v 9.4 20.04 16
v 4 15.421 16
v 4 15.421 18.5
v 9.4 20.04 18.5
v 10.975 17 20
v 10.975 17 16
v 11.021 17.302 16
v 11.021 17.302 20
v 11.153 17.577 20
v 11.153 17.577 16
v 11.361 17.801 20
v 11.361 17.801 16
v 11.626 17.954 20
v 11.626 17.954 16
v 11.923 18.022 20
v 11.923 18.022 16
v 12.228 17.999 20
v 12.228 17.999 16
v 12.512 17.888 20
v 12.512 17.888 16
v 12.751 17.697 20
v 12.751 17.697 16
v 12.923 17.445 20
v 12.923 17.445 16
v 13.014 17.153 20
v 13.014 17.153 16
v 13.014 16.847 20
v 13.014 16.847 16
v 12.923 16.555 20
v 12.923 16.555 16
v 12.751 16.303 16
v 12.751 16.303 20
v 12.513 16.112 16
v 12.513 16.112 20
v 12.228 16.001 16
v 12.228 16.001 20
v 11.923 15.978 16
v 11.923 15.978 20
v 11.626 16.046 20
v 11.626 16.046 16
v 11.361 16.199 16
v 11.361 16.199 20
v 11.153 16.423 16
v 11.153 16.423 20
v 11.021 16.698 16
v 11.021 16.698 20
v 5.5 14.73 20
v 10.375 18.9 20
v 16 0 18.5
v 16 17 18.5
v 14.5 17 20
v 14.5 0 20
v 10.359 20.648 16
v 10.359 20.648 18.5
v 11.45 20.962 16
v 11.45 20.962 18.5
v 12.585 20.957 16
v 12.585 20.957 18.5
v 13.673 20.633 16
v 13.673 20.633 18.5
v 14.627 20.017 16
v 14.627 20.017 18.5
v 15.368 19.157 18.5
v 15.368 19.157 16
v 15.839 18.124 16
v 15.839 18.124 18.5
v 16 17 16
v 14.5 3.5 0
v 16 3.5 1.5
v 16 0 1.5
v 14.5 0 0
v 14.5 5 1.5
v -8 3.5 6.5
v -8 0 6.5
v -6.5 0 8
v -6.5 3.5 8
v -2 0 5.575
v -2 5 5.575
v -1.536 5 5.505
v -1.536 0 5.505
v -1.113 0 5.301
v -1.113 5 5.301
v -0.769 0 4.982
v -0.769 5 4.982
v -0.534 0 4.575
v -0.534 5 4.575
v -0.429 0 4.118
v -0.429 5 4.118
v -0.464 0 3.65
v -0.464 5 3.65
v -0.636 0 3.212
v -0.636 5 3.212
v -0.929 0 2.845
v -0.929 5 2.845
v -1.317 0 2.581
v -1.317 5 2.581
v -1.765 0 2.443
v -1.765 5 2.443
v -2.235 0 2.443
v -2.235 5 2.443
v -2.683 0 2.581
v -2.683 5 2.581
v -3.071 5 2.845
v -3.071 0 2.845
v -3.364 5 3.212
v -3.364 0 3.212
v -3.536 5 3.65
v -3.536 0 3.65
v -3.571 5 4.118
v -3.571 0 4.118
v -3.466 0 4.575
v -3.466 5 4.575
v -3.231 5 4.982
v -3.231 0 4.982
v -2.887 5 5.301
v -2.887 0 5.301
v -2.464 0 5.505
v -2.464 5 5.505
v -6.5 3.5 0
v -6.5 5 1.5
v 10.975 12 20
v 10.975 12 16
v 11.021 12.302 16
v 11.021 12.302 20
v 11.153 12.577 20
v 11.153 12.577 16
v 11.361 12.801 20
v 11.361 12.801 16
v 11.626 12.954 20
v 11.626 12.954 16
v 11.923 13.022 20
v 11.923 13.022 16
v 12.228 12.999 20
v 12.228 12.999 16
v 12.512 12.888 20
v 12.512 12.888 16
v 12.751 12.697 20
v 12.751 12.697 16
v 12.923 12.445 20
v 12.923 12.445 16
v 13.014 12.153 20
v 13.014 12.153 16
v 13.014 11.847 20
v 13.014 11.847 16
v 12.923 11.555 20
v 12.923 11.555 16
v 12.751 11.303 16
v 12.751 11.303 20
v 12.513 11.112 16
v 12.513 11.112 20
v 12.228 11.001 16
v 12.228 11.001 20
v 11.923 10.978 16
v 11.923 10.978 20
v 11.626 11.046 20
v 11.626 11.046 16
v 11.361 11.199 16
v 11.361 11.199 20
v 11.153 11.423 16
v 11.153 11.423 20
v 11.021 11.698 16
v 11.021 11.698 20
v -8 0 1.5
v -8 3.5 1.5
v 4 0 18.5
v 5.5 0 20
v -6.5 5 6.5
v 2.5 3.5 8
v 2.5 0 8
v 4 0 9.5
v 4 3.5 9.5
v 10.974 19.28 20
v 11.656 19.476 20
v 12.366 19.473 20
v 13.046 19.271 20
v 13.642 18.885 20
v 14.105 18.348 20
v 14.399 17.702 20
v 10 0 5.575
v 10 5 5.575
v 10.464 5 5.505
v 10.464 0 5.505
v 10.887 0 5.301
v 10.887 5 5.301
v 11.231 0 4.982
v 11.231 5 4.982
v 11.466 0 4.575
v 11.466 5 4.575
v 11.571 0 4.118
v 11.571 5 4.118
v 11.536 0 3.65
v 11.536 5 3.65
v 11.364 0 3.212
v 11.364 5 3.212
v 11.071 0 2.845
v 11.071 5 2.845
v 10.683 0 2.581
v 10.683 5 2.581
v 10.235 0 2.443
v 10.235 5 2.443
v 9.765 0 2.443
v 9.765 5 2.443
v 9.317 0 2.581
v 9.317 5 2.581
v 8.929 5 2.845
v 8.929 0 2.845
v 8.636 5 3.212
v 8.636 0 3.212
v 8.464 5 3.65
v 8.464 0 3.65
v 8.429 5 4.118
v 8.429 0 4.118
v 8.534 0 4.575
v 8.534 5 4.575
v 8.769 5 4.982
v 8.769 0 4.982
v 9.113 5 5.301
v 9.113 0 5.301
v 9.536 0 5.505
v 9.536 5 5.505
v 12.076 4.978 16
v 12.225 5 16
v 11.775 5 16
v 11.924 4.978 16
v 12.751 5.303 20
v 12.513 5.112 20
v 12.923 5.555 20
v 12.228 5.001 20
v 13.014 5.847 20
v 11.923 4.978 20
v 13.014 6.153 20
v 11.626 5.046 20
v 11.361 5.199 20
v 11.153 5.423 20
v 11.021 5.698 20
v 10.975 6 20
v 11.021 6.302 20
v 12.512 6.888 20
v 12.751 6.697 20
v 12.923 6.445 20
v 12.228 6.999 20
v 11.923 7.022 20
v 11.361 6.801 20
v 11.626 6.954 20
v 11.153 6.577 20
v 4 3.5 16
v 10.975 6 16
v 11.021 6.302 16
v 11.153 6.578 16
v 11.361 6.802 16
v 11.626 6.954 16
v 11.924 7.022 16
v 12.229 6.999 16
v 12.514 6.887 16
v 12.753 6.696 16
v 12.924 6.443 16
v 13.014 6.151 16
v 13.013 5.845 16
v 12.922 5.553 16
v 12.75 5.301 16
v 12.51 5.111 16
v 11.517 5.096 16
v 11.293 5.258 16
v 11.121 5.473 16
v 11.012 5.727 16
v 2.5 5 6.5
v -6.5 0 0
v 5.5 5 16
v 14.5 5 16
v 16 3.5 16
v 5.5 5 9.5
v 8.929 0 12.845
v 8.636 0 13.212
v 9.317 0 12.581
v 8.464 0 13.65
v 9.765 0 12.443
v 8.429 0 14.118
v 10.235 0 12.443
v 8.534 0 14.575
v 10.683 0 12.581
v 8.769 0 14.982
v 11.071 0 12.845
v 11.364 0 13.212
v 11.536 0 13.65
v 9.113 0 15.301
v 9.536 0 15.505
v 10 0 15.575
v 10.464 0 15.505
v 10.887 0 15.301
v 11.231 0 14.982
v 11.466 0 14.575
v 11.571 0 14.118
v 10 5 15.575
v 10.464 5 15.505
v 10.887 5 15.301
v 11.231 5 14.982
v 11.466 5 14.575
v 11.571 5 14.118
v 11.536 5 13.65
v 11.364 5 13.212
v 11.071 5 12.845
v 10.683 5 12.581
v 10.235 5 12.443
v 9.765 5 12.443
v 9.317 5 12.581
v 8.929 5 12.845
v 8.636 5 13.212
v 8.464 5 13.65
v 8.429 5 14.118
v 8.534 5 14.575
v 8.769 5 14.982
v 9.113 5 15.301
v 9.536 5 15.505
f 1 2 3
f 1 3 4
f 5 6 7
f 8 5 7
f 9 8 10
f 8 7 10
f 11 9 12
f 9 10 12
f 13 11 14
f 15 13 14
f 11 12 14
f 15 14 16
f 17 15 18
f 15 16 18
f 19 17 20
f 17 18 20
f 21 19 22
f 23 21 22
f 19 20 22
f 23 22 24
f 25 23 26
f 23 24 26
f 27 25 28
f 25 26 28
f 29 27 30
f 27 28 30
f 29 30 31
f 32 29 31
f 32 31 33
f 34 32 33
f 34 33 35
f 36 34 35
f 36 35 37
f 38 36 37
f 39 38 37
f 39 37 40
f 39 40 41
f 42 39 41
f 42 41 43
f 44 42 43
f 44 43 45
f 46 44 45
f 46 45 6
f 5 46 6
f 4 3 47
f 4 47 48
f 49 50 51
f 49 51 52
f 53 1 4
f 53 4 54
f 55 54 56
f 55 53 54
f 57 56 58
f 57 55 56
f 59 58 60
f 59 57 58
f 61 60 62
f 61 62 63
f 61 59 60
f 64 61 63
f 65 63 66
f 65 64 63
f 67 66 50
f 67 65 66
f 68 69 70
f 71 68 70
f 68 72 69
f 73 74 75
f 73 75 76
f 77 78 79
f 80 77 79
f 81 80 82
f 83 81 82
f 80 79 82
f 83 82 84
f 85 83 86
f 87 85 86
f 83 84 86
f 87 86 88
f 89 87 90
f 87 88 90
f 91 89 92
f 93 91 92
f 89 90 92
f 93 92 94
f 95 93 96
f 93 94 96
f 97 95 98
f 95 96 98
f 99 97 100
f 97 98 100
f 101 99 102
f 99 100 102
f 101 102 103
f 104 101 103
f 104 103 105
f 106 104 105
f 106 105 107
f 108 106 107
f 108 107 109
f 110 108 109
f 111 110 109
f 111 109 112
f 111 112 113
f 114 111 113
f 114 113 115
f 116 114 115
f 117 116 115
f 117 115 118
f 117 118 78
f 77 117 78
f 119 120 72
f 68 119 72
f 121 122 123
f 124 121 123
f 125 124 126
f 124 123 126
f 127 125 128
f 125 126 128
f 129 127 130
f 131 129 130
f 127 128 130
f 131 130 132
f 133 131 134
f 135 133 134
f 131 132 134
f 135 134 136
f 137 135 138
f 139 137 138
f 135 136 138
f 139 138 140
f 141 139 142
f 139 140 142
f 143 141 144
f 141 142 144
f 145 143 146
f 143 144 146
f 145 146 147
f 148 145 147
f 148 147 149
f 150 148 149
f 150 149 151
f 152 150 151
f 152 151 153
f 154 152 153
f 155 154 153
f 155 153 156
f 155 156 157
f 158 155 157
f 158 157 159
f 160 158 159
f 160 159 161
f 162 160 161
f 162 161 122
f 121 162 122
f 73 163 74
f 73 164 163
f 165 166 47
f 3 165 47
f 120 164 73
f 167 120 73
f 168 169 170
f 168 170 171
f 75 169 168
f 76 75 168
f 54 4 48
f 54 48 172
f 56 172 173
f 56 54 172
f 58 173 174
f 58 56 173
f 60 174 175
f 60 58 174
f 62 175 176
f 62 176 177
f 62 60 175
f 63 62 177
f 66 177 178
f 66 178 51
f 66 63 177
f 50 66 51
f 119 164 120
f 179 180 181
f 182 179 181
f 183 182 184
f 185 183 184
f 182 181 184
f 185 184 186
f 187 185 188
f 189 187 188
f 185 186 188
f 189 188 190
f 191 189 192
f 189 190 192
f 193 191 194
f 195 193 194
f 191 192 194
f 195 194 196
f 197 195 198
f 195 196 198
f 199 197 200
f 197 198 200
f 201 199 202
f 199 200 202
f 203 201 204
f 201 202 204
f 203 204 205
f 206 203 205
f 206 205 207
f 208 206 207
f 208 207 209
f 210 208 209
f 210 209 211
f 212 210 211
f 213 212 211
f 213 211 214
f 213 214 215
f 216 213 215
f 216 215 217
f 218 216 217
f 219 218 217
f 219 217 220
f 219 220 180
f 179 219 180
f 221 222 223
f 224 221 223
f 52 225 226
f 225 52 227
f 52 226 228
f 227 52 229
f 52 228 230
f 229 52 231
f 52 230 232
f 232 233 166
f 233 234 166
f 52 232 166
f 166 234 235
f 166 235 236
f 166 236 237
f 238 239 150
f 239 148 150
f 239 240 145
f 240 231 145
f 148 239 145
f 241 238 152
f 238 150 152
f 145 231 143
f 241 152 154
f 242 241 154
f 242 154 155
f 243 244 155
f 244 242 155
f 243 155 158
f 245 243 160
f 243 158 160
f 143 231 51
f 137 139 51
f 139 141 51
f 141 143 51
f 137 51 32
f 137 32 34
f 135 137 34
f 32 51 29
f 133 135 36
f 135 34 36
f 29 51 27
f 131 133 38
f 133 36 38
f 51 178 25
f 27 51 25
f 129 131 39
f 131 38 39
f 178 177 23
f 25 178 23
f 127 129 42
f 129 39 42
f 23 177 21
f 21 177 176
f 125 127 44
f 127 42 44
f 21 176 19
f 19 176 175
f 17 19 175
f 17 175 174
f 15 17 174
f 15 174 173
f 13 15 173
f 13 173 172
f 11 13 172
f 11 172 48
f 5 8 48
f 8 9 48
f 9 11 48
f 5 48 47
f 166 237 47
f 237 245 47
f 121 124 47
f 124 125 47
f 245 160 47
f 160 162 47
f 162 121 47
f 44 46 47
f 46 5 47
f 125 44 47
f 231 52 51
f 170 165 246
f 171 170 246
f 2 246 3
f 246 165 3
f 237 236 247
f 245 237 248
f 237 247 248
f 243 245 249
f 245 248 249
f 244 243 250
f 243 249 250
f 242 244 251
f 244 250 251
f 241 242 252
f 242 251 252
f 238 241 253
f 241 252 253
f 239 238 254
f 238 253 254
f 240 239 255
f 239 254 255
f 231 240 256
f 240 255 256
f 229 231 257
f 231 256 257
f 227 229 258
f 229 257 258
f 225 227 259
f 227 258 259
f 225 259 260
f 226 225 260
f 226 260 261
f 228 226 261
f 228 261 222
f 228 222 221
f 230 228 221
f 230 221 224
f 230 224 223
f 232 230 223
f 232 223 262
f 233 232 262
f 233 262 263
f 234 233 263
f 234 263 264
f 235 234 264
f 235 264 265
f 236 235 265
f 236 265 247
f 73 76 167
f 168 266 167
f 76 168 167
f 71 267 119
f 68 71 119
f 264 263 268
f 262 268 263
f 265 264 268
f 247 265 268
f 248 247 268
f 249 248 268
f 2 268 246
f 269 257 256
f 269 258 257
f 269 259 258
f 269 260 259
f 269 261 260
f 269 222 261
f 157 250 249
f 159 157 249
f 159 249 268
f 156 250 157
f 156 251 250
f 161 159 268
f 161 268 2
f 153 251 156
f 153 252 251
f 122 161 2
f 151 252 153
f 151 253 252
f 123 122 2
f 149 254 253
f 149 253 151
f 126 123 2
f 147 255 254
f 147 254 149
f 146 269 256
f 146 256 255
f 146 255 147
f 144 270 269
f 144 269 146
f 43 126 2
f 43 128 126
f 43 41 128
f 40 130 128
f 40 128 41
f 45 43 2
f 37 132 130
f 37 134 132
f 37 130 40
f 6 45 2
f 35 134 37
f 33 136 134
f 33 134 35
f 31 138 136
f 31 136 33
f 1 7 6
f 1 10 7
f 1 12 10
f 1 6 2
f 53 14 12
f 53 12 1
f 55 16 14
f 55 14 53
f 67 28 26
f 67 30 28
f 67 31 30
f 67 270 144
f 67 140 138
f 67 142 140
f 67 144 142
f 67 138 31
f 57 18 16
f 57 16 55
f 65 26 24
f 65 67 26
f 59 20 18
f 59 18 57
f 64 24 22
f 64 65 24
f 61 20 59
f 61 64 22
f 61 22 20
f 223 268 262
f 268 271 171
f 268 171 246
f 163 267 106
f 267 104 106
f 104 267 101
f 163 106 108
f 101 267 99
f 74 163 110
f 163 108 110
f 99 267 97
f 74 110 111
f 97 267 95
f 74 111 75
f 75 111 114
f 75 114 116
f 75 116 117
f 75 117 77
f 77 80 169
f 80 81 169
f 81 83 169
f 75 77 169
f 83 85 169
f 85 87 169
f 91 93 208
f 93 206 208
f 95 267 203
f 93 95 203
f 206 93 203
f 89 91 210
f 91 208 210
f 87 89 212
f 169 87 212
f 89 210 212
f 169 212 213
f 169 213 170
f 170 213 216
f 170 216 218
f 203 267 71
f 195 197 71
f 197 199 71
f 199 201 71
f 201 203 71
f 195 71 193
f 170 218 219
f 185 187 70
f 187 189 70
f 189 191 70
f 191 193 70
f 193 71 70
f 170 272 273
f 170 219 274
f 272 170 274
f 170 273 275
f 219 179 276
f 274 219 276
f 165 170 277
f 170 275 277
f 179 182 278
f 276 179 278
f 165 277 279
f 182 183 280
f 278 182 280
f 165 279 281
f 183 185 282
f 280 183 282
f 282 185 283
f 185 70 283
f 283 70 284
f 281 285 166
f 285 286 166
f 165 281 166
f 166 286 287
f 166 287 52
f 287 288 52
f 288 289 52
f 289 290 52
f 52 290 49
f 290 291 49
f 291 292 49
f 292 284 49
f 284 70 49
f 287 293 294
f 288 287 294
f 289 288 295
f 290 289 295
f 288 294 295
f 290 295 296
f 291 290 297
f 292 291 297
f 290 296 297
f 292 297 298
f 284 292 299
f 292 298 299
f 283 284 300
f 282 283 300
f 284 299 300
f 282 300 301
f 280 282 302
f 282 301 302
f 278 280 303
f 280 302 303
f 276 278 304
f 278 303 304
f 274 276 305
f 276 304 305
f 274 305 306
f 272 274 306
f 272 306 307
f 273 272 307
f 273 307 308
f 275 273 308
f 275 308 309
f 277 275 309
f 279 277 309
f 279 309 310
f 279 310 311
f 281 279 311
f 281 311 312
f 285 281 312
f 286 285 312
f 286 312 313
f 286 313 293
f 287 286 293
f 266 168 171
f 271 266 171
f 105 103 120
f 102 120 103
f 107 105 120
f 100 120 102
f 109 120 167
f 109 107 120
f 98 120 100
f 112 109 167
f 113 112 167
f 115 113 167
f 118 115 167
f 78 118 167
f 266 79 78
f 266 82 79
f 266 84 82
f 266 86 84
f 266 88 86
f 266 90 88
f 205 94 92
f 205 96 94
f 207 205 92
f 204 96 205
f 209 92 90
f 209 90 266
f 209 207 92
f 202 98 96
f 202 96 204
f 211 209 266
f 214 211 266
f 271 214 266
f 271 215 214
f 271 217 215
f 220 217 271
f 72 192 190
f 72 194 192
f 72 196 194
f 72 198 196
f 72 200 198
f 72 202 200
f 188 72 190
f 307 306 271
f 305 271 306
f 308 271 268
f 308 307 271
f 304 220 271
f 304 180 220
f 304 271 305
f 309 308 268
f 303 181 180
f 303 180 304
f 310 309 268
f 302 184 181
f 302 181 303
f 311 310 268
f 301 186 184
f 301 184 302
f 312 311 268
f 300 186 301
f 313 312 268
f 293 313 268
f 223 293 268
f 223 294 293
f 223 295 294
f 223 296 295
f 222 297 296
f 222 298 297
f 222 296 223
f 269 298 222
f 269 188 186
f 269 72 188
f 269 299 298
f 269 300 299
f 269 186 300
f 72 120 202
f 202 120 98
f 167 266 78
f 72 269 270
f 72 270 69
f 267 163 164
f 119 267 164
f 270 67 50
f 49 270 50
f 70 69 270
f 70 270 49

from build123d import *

# Parameters (mm, degrees)
RESSALTO_EXTRUS_O1_DEPTH                      = 20
ESBO_O2_W                                     = 16
ESBO_O2_H                                     = 16
CORTE_EXTRUS_O1_DEPTH                         = 20
CORTE_EXTRUS_O2_DEPTH                         = 34.120990323
CHANFRO2_SIZE                                 = 1.5
FURO_ROSCADO_DE_M2_51_D                       = 2.05
ESBO_O8_W                                     = 8
ESBO_O8_H                                     = 5
RESSALTO_EXTRUS_O2_DEPTH                      = 12
CHANFRO3_SIZE                                 = 1.5
FURO_ROSCADO_PARA_CONDU_TE_DE_M3X0_51_D       = 3.15
BROCA_DE_ROSQUEAR_PARA_TARRAXA_DE_M2_51_D     = 2.05
BROCA_DE_ROSQUEAR_PARA_TARRAXA_DE_M2_51_DEPTH = 4


with BuildPart() as part:
    # Esboço1 → Ressalto-extrusão1 (new body)
    with BuildSketch(Plane.XY):
        with BuildLine():
            Line((0, 0), (0, 12))
            Line((0, 12), (9.400080843, 20.039805977))
            ThreePointArc((9.400080843, 20.039805977), (13.673368365, 20.633158174), (16, 17))
            Line((16, 17), (16, 4))
            Line((16, 4), (16, 0))
            Line((16, 0), (0, 0))
        make_face()
    extrude(amount=RESSALTO_EXTRUS_O1_DEPTH)

    # Esboço2 → Corte-extrusão1 (cut)
    with BuildSketch(Plane(origin=(16, 0, 0), x_dir=(0, 0, -1), z_dir=(1, 0, 0))):
        with Locations((-8, 13)):
            Rectangle(ESBO_O2_W, ESBO_O2_H)
    extrude(amount=-CORTE_EXTRUS_O1_DEPTH, mode=Mode.SUBTRACT)

    # Esboço3 → Corte-extrusão2 (cut, through all)
    with BuildSketch(Plane.XY.offset(20)):
        Polygon((0, 0), (4, 0), (4, 15.42116461), (0, 12), align=None)
    extrude(amount=-CORTE_EXTRUS_O2_DEPTH, mode=Mode.SUBTRACT)

    # Chanfro2
    chanfro2_edges = [part.edges().sort_by_distance(p)[0] for p in [
        (13.673368365, 20.633158174, 20),
        (6.700040421, 17.730485293, 20),
        (4, 7.710582305, 20),
        (16, 8.5, 20),
    ]]
    chamfer(chanfro2_edges, length=CHANFRO2_SIZE)

    # Furo roscado de M2.51 (through all)
    with Locations(Plane(origin=(12, 17, 20), x_dir=(1, 0, 0), z_dir=(0, 0, 1))):
        with Locations((0, 0)):
            Hole(FURO_ROSCADO_DE_M2_51_D / 2)

    # Esboço8 → Ressalto-extrusão2 (add)
    with BuildSketch(Plane.ZY.offset(-4)):
        with Locations((4, 2.5)):
            Rectangle(ESBO_O8_W, ESBO_O8_H)
    extrude(amount=RESSALTO_EXTRUS_O2_DEPTH)

    # Chanfro3
    chanfro3_edges = [part.edges().sort_by_distance(p)[0] for p in [
        (-2, 5, 8),
        (-8, 2.5, 0),
        (-8, 2.5, 8),
        (-8, 5, 4),
        (4, 5, 0),
        (16, 5, 8),
        (16, 2.5, 0),
        (4, 5, 12),
        (4, 2.5, 8),
    ]]
    chamfer(chanfro3_edges, length=CHANFRO3_SIZE)

    # Furo roscado para conduíte de M3x0.51 (through all)
    with Locations(Plane(origin=(-2, 0, 4), x_dir=(0, 0, -1), z_dir=(0, -1, 0))):
        with Locations((0, 0), (0, 12), (-10, 12)):
            Hole(FURO_ROSCADO_PARA_CONDU_TE_DE_M3X0_51_D / 2)

    # Broca de rosquear para tarraxa de M2.51
    with Locations(Plane(origin=(12, 6, 20), x_dir=(1, 0, 0), z_dir=(0, 0, 1))):
        with Locations((0, 0), (0, 6)):
            Hole(BROCA_DE_ROSQUEAR_PARA_TARRAXA_DE_M2_51_D / 2, depth=BROCA_DE_ROSQUEAR_PARA_TARRAXA_DE_M2_51_DEPTH)


solid = part.part
